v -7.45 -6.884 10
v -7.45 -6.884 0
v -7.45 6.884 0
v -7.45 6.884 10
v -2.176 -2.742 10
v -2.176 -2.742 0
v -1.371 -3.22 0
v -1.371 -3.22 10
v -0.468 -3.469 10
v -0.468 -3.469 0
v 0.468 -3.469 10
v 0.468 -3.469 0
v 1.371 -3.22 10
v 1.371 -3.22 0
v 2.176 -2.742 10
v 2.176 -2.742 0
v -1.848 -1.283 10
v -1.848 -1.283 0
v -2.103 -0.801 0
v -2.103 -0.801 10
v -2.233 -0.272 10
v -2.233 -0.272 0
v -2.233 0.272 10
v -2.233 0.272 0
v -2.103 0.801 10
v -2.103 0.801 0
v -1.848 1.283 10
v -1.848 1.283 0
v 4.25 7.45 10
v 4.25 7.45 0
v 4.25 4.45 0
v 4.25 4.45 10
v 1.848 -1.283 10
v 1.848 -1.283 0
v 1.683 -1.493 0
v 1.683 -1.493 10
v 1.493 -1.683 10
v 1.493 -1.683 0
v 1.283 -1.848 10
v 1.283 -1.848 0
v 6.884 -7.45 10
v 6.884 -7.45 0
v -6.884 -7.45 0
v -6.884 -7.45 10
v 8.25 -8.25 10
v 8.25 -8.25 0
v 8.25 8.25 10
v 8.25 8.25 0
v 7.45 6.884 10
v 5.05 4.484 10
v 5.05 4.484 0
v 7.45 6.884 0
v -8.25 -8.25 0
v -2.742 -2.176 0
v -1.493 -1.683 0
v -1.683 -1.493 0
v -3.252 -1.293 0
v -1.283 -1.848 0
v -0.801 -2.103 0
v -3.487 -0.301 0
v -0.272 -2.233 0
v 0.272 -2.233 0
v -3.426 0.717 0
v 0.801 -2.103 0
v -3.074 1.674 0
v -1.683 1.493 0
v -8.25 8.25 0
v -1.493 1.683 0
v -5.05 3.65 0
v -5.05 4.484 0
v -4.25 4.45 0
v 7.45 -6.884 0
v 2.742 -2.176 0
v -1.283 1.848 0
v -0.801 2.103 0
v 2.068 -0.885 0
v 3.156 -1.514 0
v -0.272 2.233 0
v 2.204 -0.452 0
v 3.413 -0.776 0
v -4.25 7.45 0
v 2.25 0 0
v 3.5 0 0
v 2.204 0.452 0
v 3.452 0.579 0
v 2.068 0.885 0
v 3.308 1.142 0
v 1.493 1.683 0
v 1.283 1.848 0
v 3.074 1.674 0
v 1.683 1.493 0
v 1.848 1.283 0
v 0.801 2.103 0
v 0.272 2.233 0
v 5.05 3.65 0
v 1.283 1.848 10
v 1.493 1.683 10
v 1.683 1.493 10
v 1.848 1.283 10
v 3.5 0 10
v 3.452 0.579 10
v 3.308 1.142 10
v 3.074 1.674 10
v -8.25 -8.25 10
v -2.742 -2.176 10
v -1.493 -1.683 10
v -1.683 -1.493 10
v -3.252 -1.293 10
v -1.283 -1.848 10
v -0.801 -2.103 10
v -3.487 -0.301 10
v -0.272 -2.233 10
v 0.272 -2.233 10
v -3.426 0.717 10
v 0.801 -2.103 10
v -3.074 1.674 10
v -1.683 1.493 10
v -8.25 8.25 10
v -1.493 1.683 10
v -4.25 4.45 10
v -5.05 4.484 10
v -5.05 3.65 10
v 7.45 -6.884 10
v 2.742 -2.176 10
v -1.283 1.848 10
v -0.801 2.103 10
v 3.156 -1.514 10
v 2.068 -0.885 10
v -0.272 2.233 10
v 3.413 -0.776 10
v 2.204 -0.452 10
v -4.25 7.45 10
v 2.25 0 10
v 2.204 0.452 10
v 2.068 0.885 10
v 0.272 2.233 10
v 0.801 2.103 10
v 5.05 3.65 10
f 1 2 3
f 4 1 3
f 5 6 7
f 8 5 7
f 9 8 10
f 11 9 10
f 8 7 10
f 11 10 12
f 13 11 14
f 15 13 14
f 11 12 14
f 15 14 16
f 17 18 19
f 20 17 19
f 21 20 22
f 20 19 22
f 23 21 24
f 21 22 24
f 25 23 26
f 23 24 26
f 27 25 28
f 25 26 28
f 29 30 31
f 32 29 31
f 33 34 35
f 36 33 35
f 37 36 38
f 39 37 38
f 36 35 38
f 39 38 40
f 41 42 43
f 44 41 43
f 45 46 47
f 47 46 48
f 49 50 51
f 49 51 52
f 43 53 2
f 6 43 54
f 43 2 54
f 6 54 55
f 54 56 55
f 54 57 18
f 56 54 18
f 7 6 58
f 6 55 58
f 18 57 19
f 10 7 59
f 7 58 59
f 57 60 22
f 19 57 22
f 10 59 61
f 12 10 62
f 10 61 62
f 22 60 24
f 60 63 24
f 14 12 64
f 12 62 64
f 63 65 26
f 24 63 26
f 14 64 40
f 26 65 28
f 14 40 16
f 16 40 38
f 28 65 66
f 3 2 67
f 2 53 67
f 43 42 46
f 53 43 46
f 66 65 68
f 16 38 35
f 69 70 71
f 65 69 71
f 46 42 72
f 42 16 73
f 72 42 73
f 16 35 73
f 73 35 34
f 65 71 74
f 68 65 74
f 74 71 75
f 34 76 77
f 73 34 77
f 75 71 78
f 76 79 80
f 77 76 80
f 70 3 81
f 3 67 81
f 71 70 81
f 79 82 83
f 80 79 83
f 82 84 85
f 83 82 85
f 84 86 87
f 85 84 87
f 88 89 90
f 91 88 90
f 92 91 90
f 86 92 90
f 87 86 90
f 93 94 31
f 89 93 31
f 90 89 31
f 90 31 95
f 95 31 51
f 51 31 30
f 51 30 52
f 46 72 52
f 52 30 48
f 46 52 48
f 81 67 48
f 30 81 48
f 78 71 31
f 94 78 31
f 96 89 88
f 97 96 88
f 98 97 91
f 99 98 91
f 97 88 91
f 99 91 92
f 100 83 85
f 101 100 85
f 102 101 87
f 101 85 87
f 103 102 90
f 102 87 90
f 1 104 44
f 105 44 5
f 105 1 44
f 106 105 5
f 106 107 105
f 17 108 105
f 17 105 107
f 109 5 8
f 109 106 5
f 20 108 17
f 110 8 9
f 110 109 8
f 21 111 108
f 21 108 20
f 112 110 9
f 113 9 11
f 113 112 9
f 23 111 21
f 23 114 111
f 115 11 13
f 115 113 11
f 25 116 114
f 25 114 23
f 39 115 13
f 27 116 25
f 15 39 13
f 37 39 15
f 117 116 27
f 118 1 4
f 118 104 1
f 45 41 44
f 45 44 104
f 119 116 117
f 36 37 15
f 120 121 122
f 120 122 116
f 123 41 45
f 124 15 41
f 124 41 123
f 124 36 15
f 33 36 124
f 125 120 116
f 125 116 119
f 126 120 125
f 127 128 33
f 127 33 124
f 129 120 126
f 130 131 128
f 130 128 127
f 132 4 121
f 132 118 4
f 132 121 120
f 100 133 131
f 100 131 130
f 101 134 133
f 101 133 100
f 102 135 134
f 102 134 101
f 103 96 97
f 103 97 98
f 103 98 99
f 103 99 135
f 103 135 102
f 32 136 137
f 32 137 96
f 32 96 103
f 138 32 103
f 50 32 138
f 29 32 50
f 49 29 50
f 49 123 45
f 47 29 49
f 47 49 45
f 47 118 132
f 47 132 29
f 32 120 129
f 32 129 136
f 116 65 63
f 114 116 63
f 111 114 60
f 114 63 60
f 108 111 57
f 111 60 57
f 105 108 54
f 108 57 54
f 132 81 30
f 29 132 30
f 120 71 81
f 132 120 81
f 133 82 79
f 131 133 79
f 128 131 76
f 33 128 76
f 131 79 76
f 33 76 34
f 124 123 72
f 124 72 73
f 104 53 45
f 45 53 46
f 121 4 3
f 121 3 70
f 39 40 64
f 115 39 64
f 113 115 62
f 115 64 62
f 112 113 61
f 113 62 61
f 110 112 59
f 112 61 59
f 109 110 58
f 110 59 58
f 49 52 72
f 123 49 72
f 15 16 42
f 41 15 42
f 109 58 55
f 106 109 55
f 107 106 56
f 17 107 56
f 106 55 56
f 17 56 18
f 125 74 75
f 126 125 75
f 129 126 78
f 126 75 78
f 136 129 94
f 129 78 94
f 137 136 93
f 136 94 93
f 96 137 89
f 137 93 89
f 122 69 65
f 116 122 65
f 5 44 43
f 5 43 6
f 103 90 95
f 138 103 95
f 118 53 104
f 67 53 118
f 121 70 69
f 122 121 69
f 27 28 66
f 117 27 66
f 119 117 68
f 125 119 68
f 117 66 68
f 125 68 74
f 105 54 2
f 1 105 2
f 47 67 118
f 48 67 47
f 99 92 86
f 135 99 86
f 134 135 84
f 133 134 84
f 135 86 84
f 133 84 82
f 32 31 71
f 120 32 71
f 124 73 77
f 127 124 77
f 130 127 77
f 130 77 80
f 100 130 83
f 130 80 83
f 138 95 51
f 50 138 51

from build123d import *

# Parameters (mm, degrees)
F0_W     = 16.5
F0_H     = 16.5
F1_DEPTH = 10


# Not quite as in the source:
# - a feature names something its author has since deleted; it is built from what else it names


with BuildPart() as f1:
    # F0 (on Top) → F1 (new body)
    with BuildSketch(Plane.XY):
        Rectangle(F0_W, F0_H)
        Polygon((6.8843145751, 7.45), (7.45, 7.45), (7.45, 6.8843145751), (7.45, -6.8843145751), (7.45, -7.45), (6.8843145751, -7.45), (-6.8843145751, -7.45), (-7.45, -7.45), (-7.45, -6.8843145751), (-7.45, 6.8843145751), (-7.45, 7.45), (-6.8843145751, 7.45), (-5.05, 7.45), (-4.25, 7.45), (4.25, 7.45), (5.05, 7.45), align=None, mode=Mode.SUBTRACT)
        Polygon((-4.25, 4.8156854249), (-4.25, 7.45), (-5.05, 7.45), (-5.05, 5.6156854249), align=None)
        Polygon((-4.25, 4.45), (-4.25, 4.8156854249), (-5.05, 5.6156854249), (-5.05, 4.4843145751), (-4.2156854249, 3.65), (-3.0843145751, 3.65), (-3.8843145751, 4.45), align=None)
        Polygon((7.45, 6.8843145751), (7.45, 7.45), (6.8843145751, 7.45), (5.05, 5.6156854249), (5.05, 4.4843145751), align=None)
        Polygon((-5.05, 5.6156854249), (-6.8843145751, 7.45), (-7.45, 7.45), (-7.45, 6.8843145751), (-5.05, 4.4843145751), align=None)
        with BuildLine():
            Line((-1.2828041187, 1.8484895437), (-2.1758154582, 2.7415008831))
            ThreePointArc((-2.1758154582, 2.7415008831), (-2.4748737342, 2.4748737342), (-2.7415008831, 2.1758154582))
            Line((-2.7415008831, 2.1758154582), (-1.8484895437, 1.2828041187))
            ThreePointArc((-1.8484895437, 1.2828041187), (-1.5909902577, 1.5909902577), (-1.2828041187, 1.8484895437))
        make_face()
        with BuildLine():
            ThreePointArc((-3.0738154941, 1.6738154941), (-3.4870317978, -0.3010136893), (-2.7415008831, -2.1758154582))
            Line((-2.7415008831, -2.1758154582), (-1.8484895437, -1.2828041187))
            ThreePointArc((-1.8484895437, -1.2828041187), (-2.25, 0), (-1.8484895437, 1.2828041187))
            Line((-1.8484895437, 1.2828041187), (-2.7415008831, 2.1758154582))
            ThreePointArc((-2.7415008831, 2.1758154582), (-2.9184717118, 1.9319738268), (-3.0738154941, 1.6738154941))
        make_face()
        with BuildLine():
            ThreePointArc((-2.7415008831, -2.1758154582), (-2.4748737342, -2.4748737342), (-2.1758154582, -2.7415008831))
            Line((-2.1758154582, -2.7415008831), (-1.2828041187, -1.8484895437))
            ThreePointArc((-1.2828041187, -1.8484895437), (-1.5909902577, -1.5909902577), (-1.8484895437, -1.2828041187))
            Line((-1.8484895437, -1.2828041187), (-2.7415008831, -2.1758154582))
        make_face()
        with BuildLine():
            Line((-7.45, -7.45), (-6.8843145751, -7.45))
            Line((-6.8843145751, -7.45), (-2.1758154582, -2.7415008831))
            ThreePointArc((-2.1758154582, -2.7415008831), (-2.4748737342, -2.4748737342), (-2.7415008831, -2.1758154582))
            Line((-2.7415008831, -2.1758154582), (-7.45, -6.8843145751))
            Line((-7.45, -6.8843145751), (-7.45, -7.45))
        make_face()
        with BuildLine():
            ThreePointArc((-2.1758154582, -2.7415008831), (0, -3.5), (2.1758154582, -2.7415008831))
            Line((2.1758154582, -2.7415008831), (1.2828041187, -1.8484895437))
            ThreePointArc((1.2828041187, -1.8484895437), (0, -2.25), (-1.2828041187, -1.8484895437))
            Line((-1.2828041187, -1.8484895437), (-2.1758154582, -2.7415008831))
        make_face()
        with BuildLine():
            ThreePointArc((2.1758154582, -2.7415008831), (2.4748737342, -2.4748737342), (2.7415008831, -2.1758154582))
            Line((2.7415008831, -2.1758154582), (1.8484895437, -1.2828041187))
            ThreePointArc((1.8484895437, -1.2828041187), (1.5909902577, -1.5909902577), (1.2828041187, -1.8484895437))
            Line((1.2828041187, -1.8484895437), (2.1758154582, -2.7415008831))
        make_face()
        with BuildLine():
            Line((1.8484895437, -1.2828041187), (2.7415008831, -2.1758154582))
            ThreePointArc((2.7415008831, -2.1758154582), (3.3049397189, -1.1521169448), (3.5, 0))
            ThreePointArc((3.5, 0), (3.3917808176, 0.8636103782), (3.0738154941, 1.6738154941))
            ThreePointArc((3.0738154941, 1.6738154941), (2.9184717118, 1.9319738268), (2.7415008831, 2.1758154582))
            Line((2.7415008831, 2.1758154582), (1.8484895437, 1.2828041187))
            ThreePointArc((1.8484895437, 1.2828041187), (2.1472775174, 0.672085756), (2.25, 0))
            ThreePointArc((2.25, 0), (2.1472775174, -0.672085756), (1.8484895437, -1.2828041187))
        make_face()
        with BuildLine():
            Line((7.45, -7.45), (7.45, -6.8843145751))
            Line((7.45, -6.8843145751), (2.7415008831, -2.1758154582))
            ThreePointArc((2.7415008831, -2.1758154582), (2.4748737342, -2.4748737342), (2.1758154582, -2.7415008831))
            Line((2.1758154582, -2.7415008831), (6.8843145751, -7.45))
            Line((6.8843145751, -7.45), (7.45, -7.45))
        make_face()
        with BuildLine():
            Line((1.8484895437, 1.2828041187), (2.7415008831, 2.1758154582))
            ThreePointArc((2.7415008831, 2.1758154582), (2.4748737342, 2.4748737342), (2.1758154582, 2.7415008831))
            Line((2.1758154582, 2.7415008831), (1.2828041187, 1.8484895437))
            ThreePointArc((1.2828041187, 1.8484895437), (1.5909902577, 1.5909902577), (1.8484895437, 1.2828041187))
        make_face()
        Polygon((5.05, 4.4843145751), (5.05, 5.6156854249), (4.25, 4.8156854249), (4.25, 4.45), (3.8843145751, 4.45), (3.0843145751, 3.65), (4.2156854249, 3.65), align=None)
        Polygon((5.05, 3.65), (5.05, 4.4843145751), (4.2156854249, 3.65), align=None)
        Polygon((5.05, 5.6156854249), (5.05, 7.45), (4.25, 7.45), (4.25, 4.8156854249), align=None)
        Polygon((3.0843145751, 3.65), (3.8843145751, 4.45), (-3.8843145751, 4.45), (-3.0843145751, 3.65), align=None)
        Polygon((5.05, 5.6156854249), (6.8843145751, 7.45), (5.05, 7.45), align=None)
        Polygon((-5.05, 5.6156854249), (-5.05, 7.45), (-6.8843145751, 7.45), align=None)
        Polygon((-5.05, 3.65), (-4.2156854249, 3.65), (-5.05, 4.4843145751), align=None)
        with BuildLine():
            Line((2.1758154582, 2.7415008831), (3.0843145751, 3.65))
            Line((3.0843145751, 3.65), (-3.0843145751, 3.65))
            Line((-3.0843145751, 3.65), (-2.1758154582, 2.7415008831))
            ThreePointArc((-2.1758154582, 2.7415008831), (0, 3.5), (2.1758154582, 2.7415008831))
        make_face()
        with BuildLine():
            Line((-2.1758154582, 2.7415008831), (-3.0843145751, 3.65))
            Line((-3.0843145751, 3.65), (-4.2156854249, 3.65))
            Line((-4.2156854249, 3.65), (-2.7415008831, 2.1758154582))
            ThreePointArc((-2.7415008831, 2.1758154582), (-2.4748737342, 2.4748737342), (-2.1758154582, 2.7415008831))
        make_face()
        with BuildLine():
            Line((2.7415008831, 2.1758154582), (4.2156854249, 3.65))
            Line((4.2156854249, 3.65), (3.0843145751, 3.65))
            Line((3.0843145751, 3.65), (2.1758154582, 2.7415008831))
            ThreePointArc((2.1758154582, 2.7415008831), (2.4748737342, 2.4748737342), (2.7415008831, 2.1758154582))
        make_face()
        with BuildLine():
            Line((-2.7415008831, 2.1758154582), (-4.2156854249, 3.65))
            Line((-4.2156854249, 3.65), (-5.05, 3.65))
            Line((-5.05, 3.65), (-3.0738154941, 1.6738154941))
            ThreePointArc((-3.0738154941, 1.6738154941), (-2.9184717118, 1.9319738268), (-2.7415008831, 2.1758154582))
        make_face()
        with BuildLine():
            Line((3.0738154941, 1.6738154941), (5.05, 3.65))
            Line((5.05, 3.65), (4.2156854249, 3.65))
            Line((4.2156854249, 3.65), (2.7415008831, 2.1758154582))
            ThreePointArc((2.7415008831, 2.1758154582), (2.9184717118, 1.9319738268), (3.0738154941, 1.6738154941))
        make_face()
        with BuildLine():
            Line((1.2828041187, 1.8484895437), (2.1758154582, 2.7415008831))
            ThreePointArc((2.1758154582, 2.7415008831), (0, 3.5), (-2.1758154582, 2.7415008831))
            Line((-2.1758154582, 2.7415008831), (-1.2828041187, 1.8484895437))
            ThreePointArc((-1.2828041187, 1.8484895437), (0, 2.25), (1.2828041187, 1.8484895437))
        make_face()
    extrude(amount=F1_DEPTH)


solid = f1.part
